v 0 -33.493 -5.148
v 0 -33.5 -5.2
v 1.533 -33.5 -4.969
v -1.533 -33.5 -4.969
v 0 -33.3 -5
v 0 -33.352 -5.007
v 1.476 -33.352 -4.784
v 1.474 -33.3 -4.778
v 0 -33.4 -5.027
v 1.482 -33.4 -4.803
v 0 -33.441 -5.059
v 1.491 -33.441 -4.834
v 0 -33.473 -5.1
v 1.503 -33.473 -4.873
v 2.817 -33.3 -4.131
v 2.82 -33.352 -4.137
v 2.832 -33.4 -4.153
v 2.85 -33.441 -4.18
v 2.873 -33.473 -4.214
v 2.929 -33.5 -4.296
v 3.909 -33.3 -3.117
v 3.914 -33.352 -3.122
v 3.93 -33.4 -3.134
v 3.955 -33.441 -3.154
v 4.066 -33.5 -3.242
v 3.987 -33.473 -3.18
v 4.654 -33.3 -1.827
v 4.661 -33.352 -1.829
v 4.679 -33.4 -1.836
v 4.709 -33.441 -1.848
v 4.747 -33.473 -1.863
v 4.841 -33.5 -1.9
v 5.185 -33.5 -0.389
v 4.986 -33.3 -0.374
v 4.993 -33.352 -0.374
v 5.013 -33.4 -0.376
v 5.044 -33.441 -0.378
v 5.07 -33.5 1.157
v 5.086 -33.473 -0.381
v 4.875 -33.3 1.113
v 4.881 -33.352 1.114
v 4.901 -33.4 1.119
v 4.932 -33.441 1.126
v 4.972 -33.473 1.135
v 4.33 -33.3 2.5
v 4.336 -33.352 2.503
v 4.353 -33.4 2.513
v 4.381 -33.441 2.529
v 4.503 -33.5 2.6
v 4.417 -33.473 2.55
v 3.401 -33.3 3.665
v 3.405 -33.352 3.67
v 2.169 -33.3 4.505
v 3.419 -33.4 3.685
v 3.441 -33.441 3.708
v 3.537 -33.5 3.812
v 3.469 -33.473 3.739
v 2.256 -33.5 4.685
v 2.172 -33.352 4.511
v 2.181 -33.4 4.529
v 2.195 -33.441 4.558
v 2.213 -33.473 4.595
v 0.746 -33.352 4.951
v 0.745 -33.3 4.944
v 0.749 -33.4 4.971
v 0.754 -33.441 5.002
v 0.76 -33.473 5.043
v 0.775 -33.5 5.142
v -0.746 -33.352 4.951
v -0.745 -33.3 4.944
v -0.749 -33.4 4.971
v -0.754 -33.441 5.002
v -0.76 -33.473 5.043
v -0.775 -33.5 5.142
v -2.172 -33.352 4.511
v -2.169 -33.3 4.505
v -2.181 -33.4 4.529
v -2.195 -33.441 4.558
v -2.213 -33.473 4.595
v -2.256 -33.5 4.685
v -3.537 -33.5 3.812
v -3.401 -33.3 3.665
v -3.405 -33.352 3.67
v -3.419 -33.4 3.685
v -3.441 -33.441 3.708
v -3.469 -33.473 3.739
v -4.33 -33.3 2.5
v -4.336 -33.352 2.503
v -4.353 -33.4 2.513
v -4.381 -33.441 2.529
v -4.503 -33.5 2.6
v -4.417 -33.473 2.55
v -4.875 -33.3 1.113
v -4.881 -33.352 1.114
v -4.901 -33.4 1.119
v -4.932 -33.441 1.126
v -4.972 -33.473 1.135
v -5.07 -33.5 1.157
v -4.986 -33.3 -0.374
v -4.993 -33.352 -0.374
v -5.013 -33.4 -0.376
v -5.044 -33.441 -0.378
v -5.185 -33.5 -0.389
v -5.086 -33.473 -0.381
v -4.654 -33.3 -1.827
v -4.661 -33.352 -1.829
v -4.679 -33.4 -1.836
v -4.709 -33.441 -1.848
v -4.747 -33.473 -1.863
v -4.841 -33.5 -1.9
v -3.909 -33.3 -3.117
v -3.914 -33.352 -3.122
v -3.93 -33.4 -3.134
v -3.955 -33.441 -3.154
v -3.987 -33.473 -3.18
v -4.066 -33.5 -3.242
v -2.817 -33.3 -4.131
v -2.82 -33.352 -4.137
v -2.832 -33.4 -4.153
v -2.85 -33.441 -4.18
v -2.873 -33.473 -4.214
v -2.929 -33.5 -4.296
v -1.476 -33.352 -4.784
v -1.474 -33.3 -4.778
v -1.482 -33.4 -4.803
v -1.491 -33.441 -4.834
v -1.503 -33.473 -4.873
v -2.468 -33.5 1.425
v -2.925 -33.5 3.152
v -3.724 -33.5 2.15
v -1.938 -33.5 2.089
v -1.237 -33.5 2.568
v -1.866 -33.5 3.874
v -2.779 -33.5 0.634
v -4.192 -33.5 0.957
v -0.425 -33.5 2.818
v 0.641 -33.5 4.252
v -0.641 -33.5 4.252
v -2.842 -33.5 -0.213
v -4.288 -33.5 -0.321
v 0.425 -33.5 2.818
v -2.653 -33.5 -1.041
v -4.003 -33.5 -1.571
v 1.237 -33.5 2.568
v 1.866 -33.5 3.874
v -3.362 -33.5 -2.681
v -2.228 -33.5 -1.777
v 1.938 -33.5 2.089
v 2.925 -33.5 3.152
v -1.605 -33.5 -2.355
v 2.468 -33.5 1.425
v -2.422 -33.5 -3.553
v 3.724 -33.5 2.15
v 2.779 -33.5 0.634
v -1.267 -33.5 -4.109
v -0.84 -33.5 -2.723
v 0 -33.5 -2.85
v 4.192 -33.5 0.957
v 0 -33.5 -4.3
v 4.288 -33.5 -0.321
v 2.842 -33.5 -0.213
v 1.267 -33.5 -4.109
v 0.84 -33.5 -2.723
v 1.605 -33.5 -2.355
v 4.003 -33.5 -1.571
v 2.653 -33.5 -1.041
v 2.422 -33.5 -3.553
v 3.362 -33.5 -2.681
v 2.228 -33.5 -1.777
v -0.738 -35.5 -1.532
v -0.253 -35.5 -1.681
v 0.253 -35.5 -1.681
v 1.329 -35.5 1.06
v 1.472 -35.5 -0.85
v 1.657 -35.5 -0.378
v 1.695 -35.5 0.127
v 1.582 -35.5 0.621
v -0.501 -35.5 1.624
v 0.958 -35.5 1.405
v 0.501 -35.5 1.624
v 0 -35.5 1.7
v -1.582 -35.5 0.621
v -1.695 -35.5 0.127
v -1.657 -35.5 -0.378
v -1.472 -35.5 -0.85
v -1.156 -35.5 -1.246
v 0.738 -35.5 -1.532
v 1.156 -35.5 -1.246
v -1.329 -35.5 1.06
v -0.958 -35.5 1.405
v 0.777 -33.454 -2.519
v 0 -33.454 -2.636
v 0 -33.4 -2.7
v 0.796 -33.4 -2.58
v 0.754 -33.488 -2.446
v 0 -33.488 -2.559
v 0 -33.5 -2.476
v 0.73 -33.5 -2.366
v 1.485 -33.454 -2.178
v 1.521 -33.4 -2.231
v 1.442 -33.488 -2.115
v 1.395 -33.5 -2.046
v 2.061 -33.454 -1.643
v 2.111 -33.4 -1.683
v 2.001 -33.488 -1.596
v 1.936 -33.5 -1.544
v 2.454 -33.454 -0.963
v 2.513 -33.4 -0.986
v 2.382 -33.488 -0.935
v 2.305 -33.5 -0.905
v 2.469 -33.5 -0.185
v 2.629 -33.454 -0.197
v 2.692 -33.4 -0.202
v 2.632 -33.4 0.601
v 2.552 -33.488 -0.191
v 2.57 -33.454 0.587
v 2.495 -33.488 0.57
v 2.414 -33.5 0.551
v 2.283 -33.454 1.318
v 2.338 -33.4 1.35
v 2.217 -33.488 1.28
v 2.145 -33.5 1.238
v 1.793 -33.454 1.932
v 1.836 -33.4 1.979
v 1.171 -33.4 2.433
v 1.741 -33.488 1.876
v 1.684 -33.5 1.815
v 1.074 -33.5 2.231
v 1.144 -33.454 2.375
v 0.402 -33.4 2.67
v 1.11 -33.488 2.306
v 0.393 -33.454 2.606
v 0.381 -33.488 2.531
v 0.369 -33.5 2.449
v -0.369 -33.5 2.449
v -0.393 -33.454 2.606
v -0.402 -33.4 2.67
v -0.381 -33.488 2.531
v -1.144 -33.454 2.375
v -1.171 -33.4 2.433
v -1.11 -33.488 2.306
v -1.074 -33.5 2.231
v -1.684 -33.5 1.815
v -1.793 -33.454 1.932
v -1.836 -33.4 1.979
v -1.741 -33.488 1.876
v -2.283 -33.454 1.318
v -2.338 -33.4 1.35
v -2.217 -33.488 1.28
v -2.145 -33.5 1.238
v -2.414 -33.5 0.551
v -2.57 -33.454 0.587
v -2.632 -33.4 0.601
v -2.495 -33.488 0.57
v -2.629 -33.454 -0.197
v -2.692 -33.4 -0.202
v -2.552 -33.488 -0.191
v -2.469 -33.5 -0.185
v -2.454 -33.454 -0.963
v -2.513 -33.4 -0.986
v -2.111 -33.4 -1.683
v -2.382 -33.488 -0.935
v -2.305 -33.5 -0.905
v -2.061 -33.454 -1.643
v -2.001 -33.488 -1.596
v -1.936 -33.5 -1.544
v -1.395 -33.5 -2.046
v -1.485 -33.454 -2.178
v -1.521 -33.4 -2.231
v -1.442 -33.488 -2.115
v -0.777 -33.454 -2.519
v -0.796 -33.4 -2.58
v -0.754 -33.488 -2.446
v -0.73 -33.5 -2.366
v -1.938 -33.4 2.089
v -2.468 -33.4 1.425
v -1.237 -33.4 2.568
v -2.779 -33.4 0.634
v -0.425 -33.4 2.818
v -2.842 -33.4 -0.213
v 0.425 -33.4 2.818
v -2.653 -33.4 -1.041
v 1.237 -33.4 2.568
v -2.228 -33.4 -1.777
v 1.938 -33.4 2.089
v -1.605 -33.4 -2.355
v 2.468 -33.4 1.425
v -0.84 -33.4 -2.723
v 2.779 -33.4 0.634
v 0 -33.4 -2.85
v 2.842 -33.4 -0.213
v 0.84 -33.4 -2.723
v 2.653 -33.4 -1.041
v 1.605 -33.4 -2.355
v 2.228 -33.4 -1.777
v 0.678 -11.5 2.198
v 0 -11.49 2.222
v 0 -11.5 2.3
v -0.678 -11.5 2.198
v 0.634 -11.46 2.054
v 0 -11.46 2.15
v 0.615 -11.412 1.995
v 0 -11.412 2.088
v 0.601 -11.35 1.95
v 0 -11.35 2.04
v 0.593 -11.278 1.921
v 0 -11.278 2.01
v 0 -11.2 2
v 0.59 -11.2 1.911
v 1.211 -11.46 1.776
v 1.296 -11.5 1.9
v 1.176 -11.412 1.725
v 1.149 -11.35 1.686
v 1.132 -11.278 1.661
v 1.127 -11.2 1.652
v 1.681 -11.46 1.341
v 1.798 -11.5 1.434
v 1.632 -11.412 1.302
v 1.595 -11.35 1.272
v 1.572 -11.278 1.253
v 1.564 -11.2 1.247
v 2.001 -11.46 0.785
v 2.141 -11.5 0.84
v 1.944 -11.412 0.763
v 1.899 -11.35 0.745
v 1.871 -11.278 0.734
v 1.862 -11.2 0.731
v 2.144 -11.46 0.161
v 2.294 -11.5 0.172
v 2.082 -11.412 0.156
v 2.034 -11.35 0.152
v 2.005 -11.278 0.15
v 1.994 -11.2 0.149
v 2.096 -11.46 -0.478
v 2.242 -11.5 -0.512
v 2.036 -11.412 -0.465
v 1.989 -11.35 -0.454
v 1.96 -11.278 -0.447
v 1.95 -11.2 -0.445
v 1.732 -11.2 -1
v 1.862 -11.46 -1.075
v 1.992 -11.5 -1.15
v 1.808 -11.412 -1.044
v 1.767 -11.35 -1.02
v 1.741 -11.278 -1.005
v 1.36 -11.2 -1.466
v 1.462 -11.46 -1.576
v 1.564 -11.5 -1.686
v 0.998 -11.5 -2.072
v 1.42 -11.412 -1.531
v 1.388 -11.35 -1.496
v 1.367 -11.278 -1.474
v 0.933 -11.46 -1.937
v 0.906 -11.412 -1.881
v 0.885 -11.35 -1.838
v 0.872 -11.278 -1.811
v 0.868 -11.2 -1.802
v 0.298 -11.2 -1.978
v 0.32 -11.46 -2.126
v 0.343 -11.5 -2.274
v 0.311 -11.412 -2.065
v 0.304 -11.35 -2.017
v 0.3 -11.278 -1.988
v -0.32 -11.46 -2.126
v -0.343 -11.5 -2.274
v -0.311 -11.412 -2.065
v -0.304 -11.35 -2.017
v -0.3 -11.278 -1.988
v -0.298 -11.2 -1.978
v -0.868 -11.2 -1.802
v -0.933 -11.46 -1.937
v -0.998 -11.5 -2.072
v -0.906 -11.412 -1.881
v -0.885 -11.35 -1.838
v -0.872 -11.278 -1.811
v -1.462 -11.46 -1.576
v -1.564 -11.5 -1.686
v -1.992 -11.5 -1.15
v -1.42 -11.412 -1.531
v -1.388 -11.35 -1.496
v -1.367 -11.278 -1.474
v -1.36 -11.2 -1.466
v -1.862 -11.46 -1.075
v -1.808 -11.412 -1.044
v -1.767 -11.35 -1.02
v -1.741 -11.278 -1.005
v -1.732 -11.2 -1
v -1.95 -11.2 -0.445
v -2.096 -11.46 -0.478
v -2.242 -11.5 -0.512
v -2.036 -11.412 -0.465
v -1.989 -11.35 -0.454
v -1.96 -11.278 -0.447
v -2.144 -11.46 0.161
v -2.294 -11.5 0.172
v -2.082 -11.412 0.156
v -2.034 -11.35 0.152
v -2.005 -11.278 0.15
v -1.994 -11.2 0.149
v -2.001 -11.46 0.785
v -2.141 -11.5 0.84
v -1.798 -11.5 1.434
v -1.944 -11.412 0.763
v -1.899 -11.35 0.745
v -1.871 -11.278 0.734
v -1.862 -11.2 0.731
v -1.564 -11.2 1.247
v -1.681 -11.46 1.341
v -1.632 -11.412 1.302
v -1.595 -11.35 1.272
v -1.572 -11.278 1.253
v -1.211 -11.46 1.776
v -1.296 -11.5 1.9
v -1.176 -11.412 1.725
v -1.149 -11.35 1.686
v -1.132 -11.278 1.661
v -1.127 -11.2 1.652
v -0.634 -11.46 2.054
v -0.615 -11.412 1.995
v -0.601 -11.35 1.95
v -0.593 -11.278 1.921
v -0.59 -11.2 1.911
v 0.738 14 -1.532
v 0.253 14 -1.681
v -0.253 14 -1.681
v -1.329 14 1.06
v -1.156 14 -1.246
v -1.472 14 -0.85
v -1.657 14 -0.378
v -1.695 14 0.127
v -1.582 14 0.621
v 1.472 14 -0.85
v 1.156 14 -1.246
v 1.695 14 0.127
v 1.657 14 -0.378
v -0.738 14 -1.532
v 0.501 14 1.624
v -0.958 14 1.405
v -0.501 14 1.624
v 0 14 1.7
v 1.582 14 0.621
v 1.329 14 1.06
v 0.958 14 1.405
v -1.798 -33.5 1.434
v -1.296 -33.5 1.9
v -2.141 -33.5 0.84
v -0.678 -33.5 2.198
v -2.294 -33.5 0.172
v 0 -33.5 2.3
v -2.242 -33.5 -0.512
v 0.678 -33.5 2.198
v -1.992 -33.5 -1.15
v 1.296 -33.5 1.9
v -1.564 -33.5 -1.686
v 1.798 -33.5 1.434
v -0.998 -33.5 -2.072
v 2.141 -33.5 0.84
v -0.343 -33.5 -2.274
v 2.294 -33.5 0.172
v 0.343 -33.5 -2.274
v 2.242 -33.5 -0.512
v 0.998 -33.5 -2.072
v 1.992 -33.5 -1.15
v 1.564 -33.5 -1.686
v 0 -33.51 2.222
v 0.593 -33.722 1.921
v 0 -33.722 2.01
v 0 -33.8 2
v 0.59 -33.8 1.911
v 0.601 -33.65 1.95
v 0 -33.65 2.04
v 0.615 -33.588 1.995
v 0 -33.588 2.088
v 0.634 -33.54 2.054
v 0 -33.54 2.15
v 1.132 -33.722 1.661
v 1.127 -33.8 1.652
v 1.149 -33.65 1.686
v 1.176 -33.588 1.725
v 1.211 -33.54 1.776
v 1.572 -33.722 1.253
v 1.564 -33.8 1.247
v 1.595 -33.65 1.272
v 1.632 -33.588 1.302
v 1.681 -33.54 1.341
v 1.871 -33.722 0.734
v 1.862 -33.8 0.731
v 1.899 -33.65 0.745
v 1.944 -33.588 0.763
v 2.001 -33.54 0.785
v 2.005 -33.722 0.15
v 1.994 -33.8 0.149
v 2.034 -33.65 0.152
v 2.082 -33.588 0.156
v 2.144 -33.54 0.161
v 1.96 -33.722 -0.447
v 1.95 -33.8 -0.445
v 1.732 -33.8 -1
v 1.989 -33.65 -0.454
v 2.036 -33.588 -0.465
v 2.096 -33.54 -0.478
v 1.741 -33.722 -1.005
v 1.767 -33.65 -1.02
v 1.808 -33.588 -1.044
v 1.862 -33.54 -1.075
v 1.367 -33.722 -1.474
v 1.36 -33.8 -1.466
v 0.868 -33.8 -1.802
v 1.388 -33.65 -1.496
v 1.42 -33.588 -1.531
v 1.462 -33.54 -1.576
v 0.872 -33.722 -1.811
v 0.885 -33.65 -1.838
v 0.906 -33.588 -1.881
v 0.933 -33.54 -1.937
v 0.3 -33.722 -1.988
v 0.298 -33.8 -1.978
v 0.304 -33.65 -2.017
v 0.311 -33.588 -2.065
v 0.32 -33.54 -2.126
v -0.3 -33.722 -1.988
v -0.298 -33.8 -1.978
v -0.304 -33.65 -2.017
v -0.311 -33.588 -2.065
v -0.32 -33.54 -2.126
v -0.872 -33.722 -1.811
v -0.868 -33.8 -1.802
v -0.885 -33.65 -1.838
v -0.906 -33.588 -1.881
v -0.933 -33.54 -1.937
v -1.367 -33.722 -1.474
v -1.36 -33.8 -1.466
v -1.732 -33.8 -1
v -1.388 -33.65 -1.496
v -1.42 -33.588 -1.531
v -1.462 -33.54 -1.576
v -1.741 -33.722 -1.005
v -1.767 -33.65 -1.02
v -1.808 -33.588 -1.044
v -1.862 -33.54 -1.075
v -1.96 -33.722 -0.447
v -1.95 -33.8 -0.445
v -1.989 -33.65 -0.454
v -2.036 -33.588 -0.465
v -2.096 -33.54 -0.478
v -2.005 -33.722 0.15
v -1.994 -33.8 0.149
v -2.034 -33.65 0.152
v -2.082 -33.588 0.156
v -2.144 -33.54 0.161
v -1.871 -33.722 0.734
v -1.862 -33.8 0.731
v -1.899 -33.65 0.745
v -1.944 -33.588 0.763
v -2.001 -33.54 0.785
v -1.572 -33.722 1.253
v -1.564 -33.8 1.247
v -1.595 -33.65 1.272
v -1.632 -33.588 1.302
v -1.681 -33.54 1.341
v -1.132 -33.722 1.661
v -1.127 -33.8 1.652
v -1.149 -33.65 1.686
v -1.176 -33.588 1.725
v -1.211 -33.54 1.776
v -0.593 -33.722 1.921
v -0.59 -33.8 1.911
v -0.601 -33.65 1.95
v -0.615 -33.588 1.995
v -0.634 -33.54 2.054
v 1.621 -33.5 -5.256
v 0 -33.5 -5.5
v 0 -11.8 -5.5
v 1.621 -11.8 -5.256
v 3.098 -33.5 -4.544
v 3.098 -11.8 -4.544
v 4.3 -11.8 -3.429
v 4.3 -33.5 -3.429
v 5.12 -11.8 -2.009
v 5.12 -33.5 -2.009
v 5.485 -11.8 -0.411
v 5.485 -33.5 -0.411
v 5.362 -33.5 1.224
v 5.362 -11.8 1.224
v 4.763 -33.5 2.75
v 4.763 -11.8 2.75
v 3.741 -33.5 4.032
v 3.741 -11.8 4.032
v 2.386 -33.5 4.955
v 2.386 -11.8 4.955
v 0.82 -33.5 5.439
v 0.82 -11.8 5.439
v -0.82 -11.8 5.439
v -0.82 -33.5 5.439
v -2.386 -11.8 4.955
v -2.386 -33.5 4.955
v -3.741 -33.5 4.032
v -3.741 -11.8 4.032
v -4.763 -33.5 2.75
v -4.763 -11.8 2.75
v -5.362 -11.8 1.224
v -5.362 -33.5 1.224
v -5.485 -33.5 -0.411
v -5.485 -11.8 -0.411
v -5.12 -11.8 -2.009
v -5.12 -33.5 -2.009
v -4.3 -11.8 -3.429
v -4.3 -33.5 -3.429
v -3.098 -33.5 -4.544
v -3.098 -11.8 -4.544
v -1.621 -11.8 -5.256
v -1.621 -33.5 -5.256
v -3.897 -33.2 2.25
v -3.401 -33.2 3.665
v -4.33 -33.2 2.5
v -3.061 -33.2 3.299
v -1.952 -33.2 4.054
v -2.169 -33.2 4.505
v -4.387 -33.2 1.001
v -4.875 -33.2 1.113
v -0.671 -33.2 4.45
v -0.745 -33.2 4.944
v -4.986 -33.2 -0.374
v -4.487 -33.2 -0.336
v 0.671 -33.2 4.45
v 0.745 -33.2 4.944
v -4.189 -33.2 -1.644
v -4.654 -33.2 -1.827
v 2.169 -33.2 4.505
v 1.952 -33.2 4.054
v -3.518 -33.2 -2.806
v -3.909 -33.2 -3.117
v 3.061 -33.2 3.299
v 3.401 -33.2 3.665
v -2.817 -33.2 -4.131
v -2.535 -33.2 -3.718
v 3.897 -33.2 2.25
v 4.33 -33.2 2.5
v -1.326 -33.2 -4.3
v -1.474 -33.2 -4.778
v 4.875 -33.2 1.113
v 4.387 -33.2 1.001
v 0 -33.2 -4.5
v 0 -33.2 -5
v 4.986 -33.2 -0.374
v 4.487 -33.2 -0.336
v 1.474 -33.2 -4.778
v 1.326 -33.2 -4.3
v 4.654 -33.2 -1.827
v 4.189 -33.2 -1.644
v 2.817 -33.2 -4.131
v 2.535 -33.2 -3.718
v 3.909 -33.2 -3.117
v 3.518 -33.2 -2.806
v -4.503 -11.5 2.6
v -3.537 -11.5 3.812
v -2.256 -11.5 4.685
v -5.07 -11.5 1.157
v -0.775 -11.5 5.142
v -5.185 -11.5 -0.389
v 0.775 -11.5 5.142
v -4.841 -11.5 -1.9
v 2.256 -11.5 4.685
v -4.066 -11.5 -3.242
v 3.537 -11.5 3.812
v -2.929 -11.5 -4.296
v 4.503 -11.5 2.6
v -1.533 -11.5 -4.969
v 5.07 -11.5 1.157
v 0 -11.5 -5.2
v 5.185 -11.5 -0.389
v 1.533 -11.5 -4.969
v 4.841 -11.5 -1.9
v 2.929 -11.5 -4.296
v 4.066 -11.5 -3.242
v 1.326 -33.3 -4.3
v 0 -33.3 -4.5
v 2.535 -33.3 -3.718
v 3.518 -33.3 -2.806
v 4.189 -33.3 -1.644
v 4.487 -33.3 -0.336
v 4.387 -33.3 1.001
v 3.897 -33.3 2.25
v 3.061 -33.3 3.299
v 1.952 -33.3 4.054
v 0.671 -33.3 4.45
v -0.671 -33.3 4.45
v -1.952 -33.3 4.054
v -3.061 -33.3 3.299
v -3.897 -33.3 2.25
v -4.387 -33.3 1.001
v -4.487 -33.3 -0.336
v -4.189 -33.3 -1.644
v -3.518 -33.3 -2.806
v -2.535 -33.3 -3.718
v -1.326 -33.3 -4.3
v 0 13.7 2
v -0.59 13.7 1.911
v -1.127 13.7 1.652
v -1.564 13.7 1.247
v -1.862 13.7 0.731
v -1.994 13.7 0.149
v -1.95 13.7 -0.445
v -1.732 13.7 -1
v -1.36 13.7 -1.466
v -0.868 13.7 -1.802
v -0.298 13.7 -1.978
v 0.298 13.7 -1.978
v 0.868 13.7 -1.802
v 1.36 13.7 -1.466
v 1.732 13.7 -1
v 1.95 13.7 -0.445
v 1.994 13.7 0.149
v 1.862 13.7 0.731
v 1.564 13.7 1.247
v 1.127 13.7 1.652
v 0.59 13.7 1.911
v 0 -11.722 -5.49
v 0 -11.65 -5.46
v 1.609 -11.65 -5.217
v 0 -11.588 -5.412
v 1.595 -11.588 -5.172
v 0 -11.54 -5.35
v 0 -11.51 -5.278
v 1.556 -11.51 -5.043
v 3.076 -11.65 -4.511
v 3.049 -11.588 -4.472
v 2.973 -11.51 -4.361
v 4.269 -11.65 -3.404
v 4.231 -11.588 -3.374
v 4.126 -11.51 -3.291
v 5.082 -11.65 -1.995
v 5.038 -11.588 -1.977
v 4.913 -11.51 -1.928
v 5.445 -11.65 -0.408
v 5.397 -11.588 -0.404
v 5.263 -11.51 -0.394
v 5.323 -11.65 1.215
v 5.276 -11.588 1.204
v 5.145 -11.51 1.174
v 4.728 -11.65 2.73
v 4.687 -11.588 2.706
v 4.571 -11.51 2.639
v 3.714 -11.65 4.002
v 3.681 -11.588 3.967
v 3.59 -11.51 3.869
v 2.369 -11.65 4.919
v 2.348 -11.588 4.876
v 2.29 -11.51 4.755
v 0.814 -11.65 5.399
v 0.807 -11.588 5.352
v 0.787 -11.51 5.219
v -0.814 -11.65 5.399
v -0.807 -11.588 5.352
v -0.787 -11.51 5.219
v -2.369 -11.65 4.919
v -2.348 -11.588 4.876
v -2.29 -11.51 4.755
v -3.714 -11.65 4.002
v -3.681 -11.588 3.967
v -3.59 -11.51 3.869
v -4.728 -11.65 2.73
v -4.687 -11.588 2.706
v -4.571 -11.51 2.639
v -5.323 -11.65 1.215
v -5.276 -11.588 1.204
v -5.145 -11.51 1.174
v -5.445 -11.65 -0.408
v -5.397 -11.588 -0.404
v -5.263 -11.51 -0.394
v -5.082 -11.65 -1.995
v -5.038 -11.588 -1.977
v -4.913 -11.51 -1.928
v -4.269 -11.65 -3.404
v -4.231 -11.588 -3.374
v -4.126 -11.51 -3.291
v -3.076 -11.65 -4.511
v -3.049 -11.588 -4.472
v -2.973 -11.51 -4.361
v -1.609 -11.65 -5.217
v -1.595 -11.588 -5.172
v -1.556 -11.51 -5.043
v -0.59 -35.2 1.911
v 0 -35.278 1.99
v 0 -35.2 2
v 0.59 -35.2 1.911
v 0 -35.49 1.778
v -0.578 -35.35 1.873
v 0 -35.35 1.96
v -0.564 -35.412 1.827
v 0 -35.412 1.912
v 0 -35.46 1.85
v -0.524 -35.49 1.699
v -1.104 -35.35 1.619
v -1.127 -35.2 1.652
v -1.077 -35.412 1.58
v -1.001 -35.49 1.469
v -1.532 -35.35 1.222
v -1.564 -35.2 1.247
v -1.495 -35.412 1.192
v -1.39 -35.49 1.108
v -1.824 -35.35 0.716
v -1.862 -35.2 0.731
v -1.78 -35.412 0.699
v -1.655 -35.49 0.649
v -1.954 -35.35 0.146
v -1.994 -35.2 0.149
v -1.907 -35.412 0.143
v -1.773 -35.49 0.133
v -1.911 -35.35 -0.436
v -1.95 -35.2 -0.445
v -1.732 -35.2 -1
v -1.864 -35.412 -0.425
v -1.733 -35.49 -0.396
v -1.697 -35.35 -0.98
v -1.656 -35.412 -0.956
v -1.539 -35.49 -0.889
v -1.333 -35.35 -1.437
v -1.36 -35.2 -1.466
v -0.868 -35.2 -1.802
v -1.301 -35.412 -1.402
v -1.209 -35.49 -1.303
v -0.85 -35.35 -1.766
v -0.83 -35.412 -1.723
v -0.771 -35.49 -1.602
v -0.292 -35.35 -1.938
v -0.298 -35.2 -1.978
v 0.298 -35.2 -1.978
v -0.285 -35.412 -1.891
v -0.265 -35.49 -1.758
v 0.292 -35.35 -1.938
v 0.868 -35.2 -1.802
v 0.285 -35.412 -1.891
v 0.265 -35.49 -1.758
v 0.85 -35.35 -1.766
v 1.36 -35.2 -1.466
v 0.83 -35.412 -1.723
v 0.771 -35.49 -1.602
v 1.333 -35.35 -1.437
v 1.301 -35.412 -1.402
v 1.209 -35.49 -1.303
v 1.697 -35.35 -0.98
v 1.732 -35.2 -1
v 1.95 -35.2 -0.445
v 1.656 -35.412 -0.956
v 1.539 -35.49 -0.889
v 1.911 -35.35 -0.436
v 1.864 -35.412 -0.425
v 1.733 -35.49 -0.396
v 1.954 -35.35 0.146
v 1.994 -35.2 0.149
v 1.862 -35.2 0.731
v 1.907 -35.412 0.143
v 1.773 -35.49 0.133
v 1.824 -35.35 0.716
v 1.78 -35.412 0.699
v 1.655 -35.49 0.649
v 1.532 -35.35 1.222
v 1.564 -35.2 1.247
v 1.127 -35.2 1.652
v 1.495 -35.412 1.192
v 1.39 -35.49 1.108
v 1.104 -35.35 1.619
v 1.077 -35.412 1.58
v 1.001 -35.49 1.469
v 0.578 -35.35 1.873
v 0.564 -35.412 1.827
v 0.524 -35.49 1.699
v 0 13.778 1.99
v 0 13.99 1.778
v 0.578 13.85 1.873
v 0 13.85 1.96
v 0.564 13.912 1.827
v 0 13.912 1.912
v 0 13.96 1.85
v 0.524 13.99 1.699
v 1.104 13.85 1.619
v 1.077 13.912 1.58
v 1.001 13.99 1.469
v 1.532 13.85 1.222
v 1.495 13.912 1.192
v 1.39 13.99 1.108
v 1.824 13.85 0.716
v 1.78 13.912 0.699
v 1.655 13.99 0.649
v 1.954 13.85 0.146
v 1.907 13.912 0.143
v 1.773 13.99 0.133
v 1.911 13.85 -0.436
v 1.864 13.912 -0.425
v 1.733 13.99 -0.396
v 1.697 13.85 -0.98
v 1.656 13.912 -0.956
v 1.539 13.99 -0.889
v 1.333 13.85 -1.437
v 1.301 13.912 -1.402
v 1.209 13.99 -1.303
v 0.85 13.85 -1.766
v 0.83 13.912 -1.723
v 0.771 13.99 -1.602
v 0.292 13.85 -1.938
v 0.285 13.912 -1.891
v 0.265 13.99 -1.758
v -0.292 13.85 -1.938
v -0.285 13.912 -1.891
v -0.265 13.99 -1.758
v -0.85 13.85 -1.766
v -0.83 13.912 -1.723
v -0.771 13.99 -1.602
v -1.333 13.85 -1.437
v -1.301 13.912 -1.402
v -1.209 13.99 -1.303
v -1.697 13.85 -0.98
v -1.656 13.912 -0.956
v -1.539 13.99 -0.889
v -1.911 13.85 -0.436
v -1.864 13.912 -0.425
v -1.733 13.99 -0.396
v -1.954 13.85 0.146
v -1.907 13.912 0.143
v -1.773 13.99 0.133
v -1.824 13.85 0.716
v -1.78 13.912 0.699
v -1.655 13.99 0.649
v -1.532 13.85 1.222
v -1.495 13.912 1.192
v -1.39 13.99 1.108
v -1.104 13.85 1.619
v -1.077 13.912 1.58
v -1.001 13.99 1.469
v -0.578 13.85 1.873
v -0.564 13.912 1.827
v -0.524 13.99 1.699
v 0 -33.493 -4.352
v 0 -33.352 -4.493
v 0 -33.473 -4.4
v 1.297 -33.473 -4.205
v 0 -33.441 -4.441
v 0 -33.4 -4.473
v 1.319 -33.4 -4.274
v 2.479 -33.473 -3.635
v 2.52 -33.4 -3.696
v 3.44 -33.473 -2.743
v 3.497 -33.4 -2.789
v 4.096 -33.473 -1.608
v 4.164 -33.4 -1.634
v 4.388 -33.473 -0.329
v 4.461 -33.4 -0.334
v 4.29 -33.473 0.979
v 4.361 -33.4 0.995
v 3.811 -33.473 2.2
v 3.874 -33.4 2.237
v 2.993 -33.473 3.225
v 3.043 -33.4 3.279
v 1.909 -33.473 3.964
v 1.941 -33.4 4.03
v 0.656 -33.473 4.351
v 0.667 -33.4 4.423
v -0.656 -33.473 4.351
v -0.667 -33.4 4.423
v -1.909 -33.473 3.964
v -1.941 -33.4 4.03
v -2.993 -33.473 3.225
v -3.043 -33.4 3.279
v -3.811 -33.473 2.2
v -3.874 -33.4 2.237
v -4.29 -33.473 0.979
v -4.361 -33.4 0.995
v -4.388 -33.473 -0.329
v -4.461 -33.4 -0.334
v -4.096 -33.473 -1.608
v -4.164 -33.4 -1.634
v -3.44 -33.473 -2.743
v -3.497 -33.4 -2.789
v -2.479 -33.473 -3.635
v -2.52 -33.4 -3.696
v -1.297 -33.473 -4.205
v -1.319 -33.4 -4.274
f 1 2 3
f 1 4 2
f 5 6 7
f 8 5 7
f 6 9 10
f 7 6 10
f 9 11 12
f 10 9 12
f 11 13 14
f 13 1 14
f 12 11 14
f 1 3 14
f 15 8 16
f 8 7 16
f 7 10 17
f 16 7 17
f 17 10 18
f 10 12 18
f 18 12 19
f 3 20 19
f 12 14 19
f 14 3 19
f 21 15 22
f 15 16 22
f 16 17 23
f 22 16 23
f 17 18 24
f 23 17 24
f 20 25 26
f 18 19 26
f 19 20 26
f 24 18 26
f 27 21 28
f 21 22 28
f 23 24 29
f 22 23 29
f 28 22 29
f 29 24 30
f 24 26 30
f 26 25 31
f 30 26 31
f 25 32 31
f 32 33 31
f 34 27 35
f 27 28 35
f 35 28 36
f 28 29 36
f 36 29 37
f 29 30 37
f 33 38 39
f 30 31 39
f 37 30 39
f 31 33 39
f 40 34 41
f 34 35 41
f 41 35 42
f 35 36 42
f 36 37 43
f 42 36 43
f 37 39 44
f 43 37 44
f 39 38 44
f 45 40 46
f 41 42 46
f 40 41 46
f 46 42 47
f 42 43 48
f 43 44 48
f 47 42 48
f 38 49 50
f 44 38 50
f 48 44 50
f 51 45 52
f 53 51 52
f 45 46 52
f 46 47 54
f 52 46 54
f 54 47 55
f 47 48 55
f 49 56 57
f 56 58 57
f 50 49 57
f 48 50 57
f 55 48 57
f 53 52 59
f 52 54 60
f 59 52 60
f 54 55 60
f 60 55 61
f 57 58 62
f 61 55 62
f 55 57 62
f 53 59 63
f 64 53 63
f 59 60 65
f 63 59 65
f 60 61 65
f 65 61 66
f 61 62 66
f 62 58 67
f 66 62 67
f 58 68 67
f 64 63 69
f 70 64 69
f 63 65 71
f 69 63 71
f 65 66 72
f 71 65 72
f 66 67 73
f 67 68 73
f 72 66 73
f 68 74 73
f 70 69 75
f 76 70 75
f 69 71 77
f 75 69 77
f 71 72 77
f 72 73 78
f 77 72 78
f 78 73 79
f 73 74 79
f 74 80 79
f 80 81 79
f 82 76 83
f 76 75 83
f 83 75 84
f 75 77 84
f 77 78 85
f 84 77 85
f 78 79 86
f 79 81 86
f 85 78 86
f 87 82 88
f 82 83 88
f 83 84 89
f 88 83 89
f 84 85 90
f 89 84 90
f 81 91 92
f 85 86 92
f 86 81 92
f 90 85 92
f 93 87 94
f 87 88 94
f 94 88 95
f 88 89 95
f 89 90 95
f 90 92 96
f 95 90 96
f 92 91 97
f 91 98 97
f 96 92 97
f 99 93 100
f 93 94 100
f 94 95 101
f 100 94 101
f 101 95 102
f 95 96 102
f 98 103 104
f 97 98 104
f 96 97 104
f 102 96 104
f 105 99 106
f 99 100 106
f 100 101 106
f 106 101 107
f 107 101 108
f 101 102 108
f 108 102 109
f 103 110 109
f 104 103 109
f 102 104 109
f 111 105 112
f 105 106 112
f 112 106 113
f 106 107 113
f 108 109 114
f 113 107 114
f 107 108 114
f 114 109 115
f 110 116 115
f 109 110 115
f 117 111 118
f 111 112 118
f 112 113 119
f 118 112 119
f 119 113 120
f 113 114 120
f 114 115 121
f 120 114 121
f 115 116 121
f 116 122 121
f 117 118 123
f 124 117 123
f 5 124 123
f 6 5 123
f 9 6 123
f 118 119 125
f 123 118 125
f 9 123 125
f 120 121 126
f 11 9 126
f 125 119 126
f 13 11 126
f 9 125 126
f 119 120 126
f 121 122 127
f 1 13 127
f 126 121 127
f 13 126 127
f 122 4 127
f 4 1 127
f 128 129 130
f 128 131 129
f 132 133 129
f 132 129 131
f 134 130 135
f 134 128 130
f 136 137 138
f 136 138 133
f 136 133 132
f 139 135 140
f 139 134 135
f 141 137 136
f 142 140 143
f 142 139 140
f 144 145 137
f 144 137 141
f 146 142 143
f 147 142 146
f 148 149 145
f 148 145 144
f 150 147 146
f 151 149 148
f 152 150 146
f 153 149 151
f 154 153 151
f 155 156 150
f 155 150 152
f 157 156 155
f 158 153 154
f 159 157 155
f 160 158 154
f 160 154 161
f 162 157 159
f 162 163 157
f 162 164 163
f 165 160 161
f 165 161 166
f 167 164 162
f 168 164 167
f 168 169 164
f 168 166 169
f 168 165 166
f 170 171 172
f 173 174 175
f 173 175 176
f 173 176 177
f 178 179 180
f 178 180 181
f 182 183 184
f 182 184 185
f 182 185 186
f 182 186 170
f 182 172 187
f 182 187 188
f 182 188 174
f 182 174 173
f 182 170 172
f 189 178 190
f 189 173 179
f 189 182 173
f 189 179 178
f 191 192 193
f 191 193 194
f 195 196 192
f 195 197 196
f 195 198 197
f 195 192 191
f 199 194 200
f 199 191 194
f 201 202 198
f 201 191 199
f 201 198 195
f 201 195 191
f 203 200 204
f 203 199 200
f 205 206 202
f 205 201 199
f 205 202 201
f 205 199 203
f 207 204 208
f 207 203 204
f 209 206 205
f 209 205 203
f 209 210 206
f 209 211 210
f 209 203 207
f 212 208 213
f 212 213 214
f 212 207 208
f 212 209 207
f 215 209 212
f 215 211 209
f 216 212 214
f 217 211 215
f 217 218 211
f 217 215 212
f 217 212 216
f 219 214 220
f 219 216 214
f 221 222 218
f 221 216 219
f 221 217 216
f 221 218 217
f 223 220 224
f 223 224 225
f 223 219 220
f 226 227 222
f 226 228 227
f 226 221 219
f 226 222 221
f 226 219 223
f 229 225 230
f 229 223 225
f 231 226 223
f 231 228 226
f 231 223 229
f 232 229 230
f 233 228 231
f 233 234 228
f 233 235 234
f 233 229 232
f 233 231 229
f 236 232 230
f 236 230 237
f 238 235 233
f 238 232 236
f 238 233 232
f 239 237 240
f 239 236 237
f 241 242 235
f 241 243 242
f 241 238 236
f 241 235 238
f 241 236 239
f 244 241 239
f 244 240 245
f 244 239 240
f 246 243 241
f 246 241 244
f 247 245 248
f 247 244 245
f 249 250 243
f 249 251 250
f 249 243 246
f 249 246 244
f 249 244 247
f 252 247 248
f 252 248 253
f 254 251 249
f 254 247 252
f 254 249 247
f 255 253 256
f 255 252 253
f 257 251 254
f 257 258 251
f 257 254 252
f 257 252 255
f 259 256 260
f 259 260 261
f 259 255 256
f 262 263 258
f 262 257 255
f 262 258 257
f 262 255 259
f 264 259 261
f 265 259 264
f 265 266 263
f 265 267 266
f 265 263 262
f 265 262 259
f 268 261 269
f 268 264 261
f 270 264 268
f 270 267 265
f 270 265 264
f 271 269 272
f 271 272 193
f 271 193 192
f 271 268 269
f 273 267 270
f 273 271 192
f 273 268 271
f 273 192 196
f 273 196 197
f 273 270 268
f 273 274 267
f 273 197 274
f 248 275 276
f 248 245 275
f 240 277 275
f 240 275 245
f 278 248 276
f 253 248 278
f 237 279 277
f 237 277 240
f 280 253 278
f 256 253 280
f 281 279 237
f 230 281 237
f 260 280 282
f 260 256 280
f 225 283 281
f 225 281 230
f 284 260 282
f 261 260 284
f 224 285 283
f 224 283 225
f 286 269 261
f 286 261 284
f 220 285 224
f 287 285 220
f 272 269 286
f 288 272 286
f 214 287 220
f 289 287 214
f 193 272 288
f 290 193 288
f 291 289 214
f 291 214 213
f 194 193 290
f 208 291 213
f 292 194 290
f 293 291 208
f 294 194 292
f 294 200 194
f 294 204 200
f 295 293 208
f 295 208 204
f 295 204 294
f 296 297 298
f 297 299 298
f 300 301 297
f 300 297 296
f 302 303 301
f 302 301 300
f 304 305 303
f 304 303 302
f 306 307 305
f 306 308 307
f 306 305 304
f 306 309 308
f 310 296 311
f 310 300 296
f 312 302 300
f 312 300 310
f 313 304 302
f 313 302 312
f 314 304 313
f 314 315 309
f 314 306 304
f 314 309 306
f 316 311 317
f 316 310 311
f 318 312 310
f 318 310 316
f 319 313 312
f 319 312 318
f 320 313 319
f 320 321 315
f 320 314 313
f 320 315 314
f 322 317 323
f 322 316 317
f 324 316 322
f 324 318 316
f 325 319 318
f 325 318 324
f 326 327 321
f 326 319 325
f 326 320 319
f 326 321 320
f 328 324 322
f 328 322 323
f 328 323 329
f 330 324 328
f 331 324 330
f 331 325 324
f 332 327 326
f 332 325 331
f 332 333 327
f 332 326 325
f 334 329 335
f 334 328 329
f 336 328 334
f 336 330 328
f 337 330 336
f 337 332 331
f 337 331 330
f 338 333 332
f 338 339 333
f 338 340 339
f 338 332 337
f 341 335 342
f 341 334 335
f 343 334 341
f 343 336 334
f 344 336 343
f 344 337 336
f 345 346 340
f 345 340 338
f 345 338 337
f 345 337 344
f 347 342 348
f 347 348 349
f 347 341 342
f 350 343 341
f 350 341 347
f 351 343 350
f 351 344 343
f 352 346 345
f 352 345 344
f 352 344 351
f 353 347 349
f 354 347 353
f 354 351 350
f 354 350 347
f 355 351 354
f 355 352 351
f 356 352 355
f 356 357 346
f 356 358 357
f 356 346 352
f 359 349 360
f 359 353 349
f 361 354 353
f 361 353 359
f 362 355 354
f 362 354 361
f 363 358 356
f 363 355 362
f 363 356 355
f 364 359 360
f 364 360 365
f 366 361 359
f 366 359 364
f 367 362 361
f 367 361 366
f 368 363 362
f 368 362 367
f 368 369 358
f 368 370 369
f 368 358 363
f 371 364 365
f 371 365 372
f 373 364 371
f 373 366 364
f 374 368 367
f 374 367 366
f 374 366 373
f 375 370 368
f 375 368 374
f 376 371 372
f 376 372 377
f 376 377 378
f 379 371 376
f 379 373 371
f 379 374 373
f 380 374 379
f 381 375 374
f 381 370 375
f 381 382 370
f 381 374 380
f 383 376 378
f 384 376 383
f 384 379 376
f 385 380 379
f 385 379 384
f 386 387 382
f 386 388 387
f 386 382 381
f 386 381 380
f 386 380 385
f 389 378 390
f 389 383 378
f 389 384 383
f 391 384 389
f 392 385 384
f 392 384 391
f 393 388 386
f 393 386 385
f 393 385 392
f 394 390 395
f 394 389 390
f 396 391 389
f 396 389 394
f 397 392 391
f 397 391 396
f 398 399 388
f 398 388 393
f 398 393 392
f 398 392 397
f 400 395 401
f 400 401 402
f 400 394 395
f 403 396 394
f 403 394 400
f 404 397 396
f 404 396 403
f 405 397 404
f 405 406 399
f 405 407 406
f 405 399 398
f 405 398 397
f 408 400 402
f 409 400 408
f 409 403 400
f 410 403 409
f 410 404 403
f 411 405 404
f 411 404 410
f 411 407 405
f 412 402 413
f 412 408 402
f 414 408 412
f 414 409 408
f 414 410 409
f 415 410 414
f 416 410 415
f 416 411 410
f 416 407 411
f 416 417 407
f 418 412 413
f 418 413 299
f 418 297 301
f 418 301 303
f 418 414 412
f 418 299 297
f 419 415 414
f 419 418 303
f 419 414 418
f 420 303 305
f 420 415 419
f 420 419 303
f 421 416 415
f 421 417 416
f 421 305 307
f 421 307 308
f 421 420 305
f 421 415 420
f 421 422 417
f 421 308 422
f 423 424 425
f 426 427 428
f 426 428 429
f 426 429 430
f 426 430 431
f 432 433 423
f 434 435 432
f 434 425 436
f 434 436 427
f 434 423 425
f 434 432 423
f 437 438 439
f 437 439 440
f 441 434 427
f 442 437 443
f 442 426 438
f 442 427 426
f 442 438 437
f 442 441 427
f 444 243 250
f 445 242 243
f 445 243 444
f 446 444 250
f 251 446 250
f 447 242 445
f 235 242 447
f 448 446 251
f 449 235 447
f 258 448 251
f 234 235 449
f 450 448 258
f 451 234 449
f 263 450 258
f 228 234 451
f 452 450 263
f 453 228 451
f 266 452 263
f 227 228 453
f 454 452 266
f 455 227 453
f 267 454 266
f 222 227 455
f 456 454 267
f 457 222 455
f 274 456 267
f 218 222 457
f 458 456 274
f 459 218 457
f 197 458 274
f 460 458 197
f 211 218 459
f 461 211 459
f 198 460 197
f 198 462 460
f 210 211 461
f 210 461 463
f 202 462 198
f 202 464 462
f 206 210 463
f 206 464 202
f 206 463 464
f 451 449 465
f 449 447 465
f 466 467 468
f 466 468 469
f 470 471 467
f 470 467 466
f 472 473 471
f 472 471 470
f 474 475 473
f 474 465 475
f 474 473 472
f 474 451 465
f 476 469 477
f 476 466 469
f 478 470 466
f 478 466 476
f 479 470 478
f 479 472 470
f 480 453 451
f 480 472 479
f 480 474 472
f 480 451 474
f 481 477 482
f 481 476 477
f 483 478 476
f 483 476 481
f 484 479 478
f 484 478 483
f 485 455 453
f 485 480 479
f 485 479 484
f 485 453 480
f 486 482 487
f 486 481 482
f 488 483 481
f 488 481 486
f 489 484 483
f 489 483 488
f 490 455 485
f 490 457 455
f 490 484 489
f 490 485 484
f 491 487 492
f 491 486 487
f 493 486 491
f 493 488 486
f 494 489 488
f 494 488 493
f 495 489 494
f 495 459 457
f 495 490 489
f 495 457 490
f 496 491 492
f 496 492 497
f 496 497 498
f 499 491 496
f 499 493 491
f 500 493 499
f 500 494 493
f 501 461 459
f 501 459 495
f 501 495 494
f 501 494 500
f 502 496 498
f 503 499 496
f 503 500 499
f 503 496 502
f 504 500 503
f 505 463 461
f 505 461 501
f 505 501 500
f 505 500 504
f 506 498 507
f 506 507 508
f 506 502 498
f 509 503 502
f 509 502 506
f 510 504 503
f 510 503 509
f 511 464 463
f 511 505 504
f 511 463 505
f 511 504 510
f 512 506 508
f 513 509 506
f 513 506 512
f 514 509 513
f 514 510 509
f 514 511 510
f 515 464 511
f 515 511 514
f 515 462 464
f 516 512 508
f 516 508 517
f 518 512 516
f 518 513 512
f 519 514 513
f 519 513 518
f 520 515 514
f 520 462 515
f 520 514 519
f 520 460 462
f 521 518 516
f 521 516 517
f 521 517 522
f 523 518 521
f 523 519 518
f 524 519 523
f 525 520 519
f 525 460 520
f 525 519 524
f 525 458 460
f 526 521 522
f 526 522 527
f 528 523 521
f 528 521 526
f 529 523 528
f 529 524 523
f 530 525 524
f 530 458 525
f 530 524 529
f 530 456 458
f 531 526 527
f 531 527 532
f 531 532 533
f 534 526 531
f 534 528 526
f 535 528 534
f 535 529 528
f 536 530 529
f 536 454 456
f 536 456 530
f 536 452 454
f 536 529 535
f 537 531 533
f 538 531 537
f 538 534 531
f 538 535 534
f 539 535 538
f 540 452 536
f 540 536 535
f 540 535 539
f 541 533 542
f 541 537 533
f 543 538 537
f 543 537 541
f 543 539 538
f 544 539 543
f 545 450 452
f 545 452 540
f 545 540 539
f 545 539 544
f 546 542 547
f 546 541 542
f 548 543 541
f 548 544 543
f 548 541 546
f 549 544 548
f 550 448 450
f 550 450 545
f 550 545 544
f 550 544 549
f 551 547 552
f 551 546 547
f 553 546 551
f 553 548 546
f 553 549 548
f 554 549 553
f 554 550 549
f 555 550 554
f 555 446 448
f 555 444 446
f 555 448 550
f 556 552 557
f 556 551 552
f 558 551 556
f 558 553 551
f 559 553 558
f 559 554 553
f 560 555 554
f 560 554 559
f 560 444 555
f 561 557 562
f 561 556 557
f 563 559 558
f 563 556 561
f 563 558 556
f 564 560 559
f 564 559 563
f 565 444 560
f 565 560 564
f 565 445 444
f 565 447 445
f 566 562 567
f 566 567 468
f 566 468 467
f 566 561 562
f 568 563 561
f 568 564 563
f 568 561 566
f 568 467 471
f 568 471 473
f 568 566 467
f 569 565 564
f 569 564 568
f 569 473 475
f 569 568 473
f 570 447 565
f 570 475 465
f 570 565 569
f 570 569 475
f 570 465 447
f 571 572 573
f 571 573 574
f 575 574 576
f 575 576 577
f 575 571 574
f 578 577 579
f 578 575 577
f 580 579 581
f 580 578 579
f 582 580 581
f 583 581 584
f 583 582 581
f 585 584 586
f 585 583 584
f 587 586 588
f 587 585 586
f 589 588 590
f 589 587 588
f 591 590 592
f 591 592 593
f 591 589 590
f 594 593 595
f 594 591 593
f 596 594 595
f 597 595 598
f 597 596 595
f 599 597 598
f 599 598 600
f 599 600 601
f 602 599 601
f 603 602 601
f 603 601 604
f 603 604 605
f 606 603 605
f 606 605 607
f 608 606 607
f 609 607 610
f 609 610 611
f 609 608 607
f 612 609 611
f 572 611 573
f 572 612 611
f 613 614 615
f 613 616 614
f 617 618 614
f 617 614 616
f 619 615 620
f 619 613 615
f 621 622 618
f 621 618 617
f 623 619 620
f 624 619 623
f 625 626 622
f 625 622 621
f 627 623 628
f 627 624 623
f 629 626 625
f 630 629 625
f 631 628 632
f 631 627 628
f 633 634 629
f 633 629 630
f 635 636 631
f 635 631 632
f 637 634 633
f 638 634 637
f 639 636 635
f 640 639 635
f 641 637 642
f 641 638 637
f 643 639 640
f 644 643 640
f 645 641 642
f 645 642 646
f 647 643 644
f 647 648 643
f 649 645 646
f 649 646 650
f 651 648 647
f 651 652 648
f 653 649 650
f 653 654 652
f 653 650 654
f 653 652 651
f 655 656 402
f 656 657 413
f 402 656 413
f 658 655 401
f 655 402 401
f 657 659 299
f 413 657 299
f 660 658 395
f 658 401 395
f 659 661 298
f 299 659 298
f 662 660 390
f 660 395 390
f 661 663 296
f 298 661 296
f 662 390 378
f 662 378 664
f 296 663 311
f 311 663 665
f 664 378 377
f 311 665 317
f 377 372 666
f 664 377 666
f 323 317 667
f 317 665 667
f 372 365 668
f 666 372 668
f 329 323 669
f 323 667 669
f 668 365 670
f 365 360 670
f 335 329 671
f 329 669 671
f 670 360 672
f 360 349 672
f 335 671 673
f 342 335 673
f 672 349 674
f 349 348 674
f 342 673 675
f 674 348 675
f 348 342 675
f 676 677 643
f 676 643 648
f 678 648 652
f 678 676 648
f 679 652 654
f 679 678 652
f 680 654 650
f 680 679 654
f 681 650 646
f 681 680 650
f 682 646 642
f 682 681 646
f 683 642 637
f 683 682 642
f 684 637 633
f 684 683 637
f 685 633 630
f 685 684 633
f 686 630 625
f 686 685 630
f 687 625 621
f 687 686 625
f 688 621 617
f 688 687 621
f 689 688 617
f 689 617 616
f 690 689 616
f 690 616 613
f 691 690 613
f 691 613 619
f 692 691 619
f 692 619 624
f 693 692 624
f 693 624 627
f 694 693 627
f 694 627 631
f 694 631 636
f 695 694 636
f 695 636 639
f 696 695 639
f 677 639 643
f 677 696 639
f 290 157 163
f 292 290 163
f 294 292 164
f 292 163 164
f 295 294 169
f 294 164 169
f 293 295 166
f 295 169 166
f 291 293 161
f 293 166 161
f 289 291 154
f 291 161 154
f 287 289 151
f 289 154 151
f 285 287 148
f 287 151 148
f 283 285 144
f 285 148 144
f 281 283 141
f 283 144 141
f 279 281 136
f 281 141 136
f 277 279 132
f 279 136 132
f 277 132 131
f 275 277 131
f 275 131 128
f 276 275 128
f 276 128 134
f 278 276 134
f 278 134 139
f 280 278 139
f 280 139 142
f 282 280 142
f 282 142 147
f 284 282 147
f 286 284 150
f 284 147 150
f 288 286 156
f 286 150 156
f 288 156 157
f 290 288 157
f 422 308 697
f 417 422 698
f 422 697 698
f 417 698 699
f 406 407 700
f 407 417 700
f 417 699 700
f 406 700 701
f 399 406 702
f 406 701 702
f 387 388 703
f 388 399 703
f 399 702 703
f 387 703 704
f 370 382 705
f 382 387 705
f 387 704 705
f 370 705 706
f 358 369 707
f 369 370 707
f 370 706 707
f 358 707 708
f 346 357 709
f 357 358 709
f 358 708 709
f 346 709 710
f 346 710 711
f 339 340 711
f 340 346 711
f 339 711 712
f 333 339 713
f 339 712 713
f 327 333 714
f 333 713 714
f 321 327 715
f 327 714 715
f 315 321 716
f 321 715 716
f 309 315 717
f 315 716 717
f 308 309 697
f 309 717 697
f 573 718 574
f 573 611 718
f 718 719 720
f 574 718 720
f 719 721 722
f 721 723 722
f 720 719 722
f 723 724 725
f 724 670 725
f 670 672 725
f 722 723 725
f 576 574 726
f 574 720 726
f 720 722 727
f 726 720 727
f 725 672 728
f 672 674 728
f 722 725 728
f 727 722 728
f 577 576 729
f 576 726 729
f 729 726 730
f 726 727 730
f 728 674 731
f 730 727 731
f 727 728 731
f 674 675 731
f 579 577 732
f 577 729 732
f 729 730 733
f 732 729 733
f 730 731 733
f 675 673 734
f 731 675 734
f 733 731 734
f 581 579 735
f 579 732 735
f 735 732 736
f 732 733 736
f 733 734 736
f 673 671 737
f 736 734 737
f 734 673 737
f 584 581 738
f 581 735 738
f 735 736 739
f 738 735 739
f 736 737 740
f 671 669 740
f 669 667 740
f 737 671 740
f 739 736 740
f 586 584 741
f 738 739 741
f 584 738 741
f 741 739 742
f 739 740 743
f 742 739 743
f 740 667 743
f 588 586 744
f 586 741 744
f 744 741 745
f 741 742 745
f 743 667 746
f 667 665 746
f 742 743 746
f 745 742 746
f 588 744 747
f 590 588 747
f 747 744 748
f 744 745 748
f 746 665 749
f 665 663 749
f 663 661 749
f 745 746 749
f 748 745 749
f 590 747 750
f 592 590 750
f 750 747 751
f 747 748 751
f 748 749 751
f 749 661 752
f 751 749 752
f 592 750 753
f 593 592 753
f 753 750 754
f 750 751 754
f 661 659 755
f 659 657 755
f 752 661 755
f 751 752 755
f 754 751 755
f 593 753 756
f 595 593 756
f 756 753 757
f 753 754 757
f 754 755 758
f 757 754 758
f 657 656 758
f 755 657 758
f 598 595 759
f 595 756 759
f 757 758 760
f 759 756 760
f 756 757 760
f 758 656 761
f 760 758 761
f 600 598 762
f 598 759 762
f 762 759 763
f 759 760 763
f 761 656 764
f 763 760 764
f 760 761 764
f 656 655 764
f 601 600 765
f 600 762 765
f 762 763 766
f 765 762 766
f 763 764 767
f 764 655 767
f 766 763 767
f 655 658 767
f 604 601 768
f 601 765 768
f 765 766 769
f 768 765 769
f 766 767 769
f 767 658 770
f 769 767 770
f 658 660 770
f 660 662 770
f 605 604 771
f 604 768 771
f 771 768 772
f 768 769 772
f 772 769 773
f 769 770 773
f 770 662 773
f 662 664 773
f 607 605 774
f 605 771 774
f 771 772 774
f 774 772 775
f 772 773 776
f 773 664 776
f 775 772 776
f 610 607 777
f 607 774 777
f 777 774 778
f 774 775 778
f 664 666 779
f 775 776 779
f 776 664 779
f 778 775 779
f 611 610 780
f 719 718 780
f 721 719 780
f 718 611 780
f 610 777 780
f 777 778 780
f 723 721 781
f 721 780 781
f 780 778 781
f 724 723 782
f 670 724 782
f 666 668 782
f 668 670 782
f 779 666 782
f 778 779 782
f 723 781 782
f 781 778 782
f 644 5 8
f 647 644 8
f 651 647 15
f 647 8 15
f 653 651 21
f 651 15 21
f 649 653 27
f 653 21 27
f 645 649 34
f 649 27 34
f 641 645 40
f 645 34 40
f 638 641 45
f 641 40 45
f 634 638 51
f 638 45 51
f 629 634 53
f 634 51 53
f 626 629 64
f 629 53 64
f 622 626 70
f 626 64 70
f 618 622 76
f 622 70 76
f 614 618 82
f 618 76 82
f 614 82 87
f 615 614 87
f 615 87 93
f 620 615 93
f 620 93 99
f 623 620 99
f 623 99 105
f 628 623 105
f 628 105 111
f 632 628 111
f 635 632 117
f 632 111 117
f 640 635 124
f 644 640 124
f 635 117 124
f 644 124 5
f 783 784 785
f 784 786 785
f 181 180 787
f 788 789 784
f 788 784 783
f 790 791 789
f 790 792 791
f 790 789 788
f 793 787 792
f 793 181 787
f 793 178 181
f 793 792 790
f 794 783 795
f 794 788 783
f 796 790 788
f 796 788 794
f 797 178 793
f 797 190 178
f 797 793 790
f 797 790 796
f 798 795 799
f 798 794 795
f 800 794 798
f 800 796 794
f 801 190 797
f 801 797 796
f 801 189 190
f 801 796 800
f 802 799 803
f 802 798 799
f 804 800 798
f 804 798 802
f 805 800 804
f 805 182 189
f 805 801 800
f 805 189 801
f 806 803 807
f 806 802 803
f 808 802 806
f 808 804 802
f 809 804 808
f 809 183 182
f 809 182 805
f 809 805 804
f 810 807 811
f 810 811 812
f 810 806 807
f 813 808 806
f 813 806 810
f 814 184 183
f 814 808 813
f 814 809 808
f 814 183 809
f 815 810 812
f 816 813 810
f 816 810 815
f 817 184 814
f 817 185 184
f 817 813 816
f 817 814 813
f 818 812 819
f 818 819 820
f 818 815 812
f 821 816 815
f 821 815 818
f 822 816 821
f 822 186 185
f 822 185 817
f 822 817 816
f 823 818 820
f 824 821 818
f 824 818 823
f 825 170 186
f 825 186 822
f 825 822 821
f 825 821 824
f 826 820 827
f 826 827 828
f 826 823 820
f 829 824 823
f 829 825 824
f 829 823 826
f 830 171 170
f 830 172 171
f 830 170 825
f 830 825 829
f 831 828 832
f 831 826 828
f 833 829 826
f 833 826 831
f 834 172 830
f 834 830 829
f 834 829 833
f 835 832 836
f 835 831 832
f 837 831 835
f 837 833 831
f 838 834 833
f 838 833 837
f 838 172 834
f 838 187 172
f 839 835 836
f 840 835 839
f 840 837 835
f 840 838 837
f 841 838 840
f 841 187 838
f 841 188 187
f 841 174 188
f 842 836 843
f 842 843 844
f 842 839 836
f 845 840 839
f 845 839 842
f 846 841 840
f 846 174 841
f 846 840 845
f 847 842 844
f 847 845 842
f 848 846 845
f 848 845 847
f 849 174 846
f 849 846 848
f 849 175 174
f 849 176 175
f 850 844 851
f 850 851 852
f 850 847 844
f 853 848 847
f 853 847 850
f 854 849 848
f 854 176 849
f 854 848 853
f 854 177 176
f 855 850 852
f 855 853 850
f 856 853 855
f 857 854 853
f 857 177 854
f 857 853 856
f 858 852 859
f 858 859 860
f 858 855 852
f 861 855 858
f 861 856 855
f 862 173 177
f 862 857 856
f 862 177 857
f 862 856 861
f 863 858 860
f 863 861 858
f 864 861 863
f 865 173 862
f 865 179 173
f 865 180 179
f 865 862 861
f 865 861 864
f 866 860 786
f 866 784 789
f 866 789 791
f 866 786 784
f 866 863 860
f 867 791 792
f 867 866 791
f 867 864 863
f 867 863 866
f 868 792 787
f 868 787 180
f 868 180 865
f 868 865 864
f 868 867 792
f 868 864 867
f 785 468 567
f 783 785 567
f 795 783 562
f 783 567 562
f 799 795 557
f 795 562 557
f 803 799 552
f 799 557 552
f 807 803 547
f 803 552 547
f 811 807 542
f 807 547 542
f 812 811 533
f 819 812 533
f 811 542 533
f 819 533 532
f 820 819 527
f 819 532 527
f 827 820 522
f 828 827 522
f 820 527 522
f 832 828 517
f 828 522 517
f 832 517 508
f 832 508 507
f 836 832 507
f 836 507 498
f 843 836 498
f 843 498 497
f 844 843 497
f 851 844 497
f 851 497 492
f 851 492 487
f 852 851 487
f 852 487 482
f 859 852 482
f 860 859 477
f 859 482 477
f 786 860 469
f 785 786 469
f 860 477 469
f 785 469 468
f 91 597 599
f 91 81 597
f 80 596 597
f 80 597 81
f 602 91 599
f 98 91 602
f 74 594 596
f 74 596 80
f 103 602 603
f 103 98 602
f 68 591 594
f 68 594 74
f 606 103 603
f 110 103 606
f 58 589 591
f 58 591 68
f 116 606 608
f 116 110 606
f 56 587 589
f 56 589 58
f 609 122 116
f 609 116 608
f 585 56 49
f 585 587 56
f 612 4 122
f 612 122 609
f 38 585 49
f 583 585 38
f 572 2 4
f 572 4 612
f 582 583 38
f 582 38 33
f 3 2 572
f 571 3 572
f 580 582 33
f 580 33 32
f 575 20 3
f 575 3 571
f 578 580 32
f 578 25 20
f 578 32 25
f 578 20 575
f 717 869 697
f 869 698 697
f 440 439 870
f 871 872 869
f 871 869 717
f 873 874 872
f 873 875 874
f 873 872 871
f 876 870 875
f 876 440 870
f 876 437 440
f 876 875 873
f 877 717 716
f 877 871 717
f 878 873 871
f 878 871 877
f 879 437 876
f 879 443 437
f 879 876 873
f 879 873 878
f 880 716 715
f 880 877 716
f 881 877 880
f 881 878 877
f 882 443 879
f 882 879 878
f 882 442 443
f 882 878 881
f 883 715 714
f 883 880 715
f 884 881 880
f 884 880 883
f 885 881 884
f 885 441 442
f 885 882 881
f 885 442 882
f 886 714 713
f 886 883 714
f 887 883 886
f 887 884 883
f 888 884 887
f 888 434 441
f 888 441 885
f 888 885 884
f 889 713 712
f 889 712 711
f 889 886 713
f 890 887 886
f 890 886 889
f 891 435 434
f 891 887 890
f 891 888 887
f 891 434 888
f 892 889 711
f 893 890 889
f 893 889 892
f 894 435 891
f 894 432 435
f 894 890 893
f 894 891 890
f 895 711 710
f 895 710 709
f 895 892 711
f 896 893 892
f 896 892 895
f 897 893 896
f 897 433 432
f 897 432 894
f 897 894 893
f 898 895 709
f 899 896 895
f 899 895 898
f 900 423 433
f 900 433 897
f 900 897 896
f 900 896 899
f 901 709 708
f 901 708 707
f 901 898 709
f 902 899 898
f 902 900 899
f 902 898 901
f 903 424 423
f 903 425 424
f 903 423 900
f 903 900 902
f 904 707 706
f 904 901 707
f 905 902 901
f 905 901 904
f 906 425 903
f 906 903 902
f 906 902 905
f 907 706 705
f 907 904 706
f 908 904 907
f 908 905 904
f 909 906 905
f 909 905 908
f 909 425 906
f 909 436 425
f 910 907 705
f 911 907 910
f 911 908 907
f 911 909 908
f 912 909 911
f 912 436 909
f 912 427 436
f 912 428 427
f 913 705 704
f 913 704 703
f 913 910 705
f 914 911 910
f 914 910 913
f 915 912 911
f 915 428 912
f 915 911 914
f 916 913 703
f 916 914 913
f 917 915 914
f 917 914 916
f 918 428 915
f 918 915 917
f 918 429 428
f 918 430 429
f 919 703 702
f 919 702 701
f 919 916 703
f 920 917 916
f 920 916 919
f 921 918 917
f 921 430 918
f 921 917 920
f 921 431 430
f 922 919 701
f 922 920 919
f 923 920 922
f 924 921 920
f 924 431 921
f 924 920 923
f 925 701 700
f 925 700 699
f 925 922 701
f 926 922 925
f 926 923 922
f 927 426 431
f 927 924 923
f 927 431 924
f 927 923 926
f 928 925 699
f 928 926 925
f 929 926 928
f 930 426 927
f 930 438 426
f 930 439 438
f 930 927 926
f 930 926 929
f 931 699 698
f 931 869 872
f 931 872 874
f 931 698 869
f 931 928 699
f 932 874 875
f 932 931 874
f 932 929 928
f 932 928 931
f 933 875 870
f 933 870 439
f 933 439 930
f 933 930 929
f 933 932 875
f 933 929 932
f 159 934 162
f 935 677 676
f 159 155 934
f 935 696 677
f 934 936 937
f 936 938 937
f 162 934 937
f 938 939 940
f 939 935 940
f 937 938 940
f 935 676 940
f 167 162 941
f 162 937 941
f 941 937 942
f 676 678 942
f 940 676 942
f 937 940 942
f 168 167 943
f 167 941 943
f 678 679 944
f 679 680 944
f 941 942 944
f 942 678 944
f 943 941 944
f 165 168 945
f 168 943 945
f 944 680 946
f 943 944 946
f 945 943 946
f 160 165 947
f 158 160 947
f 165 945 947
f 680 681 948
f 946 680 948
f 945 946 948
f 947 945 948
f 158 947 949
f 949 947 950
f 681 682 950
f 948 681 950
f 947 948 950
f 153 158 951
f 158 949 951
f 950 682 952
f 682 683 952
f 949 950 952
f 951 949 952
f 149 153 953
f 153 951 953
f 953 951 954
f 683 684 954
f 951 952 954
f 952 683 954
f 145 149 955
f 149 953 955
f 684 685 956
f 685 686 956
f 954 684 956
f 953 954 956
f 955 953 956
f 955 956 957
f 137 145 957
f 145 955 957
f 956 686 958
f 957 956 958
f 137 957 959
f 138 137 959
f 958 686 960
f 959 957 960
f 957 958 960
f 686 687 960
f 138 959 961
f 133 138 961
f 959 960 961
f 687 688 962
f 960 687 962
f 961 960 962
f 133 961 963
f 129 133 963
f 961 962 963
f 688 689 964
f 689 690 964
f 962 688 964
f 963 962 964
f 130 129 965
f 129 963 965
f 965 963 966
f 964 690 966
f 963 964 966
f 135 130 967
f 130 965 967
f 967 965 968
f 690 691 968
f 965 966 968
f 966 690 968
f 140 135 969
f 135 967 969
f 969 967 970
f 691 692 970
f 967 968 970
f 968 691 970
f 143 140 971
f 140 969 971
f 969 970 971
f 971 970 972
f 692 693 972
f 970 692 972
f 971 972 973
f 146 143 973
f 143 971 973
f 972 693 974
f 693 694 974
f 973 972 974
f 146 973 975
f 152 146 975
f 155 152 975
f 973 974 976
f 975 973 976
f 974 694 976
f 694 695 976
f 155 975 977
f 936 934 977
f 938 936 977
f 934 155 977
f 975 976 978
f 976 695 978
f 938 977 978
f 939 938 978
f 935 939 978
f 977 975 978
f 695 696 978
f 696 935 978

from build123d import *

# Parameters (mm, degrees)
SKETCH1_R           = 2
BOSS_EXTRUDE1_DEPTH = 11.5
BOSS_EXTRUDE2_START = 14
SKETCH3_R           = 2
BOSS_EXTRUDE2_DEPTH = 14
SKETCH4_R           = 2
BOSS_EXTRUDE3_DEPTH = 24
SKETCH5_R           = 5.5
BOSS_EXTRUDE4_DEPTH = 22
FILLET1_R           = 0.3
FILLET2_R           = 0.3
SKETCH6_R           = 2.85
SKETCH6_R_2         = 2.7
CUT_EXTRUDE1_DEPTH  = 0.1
FILLET3_R           = 0.3
SKETCH7_R           = 5
SKETCH7_R_2         = 4.5
CUT_EXTRUDE2_DEPTH  = 0.3
FILLET4_R           = 0.2


with BuildPart() as part:
    # Sketch1 → Boss-Extrude1 (new body)
    with BuildSketch(Plane(origin=(0, 0, 0), x_dir=(1, 0, 0), z_dir=(0, 1, 0))):
        with Locations(Location((0, 0, 0), (0, 0, 270))):
            Circle(SKETCH1_R)
    extrude(amount=-BOSS_EXTRUDE1_DEPTH)

    # Sketch3 → Boss-Extrude2 (add)
    with BuildSketch(Plane(origin=(0, 0, 0), x_dir=(1, 0, 0), z_dir=(0, 1, 0)).offset(BOSS_EXTRUDE2_START)):
        with Locations(Location((0, 0, 0), (0, 0, 270))):
            Circle(SKETCH3_R)
    extrude(amount=-BOSS_EXTRUDE2_DEPTH)

    # Sketch4 → Boss-Extrude3 (add)
    with BuildSketch(Plane.XZ.offset(11.5)):
        with Locations(Location((0, 0, 0), (0, 0, 90))):
            Circle(SKETCH4_R)
    extrude(amount=BOSS_EXTRUDE3_DEPTH)

    # Sketch5 → Boss-Extrude4 (add)
    with BuildSketch(Plane(origin=(0, -33.5, 0), x_dir=(-1, 0, 0), z_dir=(0, -1, 0))):
        with Locations(Location((0, 0, 0), (0, 0, 90))):
            Circle(SKETCH5_R)
    extrude(amount=-BOSS_EXTRUDE4_DEPTH)

    # Fillet1
    fillet1_edges = [part.edges().sort_by_distance(p)[0] for p in [
        (0, -35.5, -2),
        (0, 14, -2),
    ]]
    fillet(fillet1_edges, radius=FILLET1_R)

    # Fillet2
    fillet2_edges = [part.edges().sort_by_distance(p)[0] for p in [
        (0, -33.5, -2),
        (0, -11.5, -2),
        (0, -11.5, 5.5),
    ]]
    fillet(fillet2_edges, radius=FILLET2_R)

    # Sketch6 → Cut-Extrude1 (cut)
    with BuildSketch(Plane.XZ.offset(33.5)):
        with Locations(Location((0, 0, 0), (0, 0, 270))):
            Circle(SKETCH6_R)
        with Locations(Location((0, 0, 0), (0, 0, 270))):
            Circle(SKETCH6_R_2, mode=Mode.SUBTRACT)
    extrude(amount=-CUT_EXTRUDE1_DEPTH, mode=Mode.SUBTRACT)

    # Fillet3
    # the kernel refuses this fillet: 0.3 mm, written as the material it takes off along each edge
    with BuildSketch(Plane(origin=(0, -33.5, 0), x_dir=(0, 0, -1), z_dir=(-1, 0, 0))) as fillet3_piece_1:
        with BuildLine():
            CenterArc((2.476393202, -0.3), FILLET3_R, 41.810314896, 48.189685104)
            Line((2.476393202, 0), (2.476393202, 0.006))
            Line((2.476393202, 0.006), (2.7, 0.006))
            Line((2.7, 0.006), (2.706, 0))
            ThreePointArc((2.706, 0), (2.706, -0.05), (2.704472136, -0.096))
            Line((2.704472136, -0.096), (2.7, -0.1))
        make_face()
    revolve(axis=Axis((0, -33.5, 0), (0, -1, 0)), mode=Mode.SUBTRACT)

    # Sketch7 → Cut-Extrude2 (cut)
    with BuildSketch(Plane.XZ.offset(33.5)):
        with Locations(Location((0, 0, 0), (0, 0, 270))):
            Circle(SKETCH7_R)
        with Locations(Location((0, 0, 0), (0, 0, 270))):
            Circle(SKETCH7_R_2, mode=Mode.SUBTRACT)
    extrude(amount=-CUT_EXTRUDE2_DEPTH, mode=Mode.SUBTRACT)

    # Fillet4
    fillet4_edges = [part.edges().sort_by_distance(p)[0] for p in [
        (0, -33.5, 5),
        (0, -33.5, 4.5),
    ]]
    fillet(fillet4_edges, radius=FILLET4_R)


solid = part.part
